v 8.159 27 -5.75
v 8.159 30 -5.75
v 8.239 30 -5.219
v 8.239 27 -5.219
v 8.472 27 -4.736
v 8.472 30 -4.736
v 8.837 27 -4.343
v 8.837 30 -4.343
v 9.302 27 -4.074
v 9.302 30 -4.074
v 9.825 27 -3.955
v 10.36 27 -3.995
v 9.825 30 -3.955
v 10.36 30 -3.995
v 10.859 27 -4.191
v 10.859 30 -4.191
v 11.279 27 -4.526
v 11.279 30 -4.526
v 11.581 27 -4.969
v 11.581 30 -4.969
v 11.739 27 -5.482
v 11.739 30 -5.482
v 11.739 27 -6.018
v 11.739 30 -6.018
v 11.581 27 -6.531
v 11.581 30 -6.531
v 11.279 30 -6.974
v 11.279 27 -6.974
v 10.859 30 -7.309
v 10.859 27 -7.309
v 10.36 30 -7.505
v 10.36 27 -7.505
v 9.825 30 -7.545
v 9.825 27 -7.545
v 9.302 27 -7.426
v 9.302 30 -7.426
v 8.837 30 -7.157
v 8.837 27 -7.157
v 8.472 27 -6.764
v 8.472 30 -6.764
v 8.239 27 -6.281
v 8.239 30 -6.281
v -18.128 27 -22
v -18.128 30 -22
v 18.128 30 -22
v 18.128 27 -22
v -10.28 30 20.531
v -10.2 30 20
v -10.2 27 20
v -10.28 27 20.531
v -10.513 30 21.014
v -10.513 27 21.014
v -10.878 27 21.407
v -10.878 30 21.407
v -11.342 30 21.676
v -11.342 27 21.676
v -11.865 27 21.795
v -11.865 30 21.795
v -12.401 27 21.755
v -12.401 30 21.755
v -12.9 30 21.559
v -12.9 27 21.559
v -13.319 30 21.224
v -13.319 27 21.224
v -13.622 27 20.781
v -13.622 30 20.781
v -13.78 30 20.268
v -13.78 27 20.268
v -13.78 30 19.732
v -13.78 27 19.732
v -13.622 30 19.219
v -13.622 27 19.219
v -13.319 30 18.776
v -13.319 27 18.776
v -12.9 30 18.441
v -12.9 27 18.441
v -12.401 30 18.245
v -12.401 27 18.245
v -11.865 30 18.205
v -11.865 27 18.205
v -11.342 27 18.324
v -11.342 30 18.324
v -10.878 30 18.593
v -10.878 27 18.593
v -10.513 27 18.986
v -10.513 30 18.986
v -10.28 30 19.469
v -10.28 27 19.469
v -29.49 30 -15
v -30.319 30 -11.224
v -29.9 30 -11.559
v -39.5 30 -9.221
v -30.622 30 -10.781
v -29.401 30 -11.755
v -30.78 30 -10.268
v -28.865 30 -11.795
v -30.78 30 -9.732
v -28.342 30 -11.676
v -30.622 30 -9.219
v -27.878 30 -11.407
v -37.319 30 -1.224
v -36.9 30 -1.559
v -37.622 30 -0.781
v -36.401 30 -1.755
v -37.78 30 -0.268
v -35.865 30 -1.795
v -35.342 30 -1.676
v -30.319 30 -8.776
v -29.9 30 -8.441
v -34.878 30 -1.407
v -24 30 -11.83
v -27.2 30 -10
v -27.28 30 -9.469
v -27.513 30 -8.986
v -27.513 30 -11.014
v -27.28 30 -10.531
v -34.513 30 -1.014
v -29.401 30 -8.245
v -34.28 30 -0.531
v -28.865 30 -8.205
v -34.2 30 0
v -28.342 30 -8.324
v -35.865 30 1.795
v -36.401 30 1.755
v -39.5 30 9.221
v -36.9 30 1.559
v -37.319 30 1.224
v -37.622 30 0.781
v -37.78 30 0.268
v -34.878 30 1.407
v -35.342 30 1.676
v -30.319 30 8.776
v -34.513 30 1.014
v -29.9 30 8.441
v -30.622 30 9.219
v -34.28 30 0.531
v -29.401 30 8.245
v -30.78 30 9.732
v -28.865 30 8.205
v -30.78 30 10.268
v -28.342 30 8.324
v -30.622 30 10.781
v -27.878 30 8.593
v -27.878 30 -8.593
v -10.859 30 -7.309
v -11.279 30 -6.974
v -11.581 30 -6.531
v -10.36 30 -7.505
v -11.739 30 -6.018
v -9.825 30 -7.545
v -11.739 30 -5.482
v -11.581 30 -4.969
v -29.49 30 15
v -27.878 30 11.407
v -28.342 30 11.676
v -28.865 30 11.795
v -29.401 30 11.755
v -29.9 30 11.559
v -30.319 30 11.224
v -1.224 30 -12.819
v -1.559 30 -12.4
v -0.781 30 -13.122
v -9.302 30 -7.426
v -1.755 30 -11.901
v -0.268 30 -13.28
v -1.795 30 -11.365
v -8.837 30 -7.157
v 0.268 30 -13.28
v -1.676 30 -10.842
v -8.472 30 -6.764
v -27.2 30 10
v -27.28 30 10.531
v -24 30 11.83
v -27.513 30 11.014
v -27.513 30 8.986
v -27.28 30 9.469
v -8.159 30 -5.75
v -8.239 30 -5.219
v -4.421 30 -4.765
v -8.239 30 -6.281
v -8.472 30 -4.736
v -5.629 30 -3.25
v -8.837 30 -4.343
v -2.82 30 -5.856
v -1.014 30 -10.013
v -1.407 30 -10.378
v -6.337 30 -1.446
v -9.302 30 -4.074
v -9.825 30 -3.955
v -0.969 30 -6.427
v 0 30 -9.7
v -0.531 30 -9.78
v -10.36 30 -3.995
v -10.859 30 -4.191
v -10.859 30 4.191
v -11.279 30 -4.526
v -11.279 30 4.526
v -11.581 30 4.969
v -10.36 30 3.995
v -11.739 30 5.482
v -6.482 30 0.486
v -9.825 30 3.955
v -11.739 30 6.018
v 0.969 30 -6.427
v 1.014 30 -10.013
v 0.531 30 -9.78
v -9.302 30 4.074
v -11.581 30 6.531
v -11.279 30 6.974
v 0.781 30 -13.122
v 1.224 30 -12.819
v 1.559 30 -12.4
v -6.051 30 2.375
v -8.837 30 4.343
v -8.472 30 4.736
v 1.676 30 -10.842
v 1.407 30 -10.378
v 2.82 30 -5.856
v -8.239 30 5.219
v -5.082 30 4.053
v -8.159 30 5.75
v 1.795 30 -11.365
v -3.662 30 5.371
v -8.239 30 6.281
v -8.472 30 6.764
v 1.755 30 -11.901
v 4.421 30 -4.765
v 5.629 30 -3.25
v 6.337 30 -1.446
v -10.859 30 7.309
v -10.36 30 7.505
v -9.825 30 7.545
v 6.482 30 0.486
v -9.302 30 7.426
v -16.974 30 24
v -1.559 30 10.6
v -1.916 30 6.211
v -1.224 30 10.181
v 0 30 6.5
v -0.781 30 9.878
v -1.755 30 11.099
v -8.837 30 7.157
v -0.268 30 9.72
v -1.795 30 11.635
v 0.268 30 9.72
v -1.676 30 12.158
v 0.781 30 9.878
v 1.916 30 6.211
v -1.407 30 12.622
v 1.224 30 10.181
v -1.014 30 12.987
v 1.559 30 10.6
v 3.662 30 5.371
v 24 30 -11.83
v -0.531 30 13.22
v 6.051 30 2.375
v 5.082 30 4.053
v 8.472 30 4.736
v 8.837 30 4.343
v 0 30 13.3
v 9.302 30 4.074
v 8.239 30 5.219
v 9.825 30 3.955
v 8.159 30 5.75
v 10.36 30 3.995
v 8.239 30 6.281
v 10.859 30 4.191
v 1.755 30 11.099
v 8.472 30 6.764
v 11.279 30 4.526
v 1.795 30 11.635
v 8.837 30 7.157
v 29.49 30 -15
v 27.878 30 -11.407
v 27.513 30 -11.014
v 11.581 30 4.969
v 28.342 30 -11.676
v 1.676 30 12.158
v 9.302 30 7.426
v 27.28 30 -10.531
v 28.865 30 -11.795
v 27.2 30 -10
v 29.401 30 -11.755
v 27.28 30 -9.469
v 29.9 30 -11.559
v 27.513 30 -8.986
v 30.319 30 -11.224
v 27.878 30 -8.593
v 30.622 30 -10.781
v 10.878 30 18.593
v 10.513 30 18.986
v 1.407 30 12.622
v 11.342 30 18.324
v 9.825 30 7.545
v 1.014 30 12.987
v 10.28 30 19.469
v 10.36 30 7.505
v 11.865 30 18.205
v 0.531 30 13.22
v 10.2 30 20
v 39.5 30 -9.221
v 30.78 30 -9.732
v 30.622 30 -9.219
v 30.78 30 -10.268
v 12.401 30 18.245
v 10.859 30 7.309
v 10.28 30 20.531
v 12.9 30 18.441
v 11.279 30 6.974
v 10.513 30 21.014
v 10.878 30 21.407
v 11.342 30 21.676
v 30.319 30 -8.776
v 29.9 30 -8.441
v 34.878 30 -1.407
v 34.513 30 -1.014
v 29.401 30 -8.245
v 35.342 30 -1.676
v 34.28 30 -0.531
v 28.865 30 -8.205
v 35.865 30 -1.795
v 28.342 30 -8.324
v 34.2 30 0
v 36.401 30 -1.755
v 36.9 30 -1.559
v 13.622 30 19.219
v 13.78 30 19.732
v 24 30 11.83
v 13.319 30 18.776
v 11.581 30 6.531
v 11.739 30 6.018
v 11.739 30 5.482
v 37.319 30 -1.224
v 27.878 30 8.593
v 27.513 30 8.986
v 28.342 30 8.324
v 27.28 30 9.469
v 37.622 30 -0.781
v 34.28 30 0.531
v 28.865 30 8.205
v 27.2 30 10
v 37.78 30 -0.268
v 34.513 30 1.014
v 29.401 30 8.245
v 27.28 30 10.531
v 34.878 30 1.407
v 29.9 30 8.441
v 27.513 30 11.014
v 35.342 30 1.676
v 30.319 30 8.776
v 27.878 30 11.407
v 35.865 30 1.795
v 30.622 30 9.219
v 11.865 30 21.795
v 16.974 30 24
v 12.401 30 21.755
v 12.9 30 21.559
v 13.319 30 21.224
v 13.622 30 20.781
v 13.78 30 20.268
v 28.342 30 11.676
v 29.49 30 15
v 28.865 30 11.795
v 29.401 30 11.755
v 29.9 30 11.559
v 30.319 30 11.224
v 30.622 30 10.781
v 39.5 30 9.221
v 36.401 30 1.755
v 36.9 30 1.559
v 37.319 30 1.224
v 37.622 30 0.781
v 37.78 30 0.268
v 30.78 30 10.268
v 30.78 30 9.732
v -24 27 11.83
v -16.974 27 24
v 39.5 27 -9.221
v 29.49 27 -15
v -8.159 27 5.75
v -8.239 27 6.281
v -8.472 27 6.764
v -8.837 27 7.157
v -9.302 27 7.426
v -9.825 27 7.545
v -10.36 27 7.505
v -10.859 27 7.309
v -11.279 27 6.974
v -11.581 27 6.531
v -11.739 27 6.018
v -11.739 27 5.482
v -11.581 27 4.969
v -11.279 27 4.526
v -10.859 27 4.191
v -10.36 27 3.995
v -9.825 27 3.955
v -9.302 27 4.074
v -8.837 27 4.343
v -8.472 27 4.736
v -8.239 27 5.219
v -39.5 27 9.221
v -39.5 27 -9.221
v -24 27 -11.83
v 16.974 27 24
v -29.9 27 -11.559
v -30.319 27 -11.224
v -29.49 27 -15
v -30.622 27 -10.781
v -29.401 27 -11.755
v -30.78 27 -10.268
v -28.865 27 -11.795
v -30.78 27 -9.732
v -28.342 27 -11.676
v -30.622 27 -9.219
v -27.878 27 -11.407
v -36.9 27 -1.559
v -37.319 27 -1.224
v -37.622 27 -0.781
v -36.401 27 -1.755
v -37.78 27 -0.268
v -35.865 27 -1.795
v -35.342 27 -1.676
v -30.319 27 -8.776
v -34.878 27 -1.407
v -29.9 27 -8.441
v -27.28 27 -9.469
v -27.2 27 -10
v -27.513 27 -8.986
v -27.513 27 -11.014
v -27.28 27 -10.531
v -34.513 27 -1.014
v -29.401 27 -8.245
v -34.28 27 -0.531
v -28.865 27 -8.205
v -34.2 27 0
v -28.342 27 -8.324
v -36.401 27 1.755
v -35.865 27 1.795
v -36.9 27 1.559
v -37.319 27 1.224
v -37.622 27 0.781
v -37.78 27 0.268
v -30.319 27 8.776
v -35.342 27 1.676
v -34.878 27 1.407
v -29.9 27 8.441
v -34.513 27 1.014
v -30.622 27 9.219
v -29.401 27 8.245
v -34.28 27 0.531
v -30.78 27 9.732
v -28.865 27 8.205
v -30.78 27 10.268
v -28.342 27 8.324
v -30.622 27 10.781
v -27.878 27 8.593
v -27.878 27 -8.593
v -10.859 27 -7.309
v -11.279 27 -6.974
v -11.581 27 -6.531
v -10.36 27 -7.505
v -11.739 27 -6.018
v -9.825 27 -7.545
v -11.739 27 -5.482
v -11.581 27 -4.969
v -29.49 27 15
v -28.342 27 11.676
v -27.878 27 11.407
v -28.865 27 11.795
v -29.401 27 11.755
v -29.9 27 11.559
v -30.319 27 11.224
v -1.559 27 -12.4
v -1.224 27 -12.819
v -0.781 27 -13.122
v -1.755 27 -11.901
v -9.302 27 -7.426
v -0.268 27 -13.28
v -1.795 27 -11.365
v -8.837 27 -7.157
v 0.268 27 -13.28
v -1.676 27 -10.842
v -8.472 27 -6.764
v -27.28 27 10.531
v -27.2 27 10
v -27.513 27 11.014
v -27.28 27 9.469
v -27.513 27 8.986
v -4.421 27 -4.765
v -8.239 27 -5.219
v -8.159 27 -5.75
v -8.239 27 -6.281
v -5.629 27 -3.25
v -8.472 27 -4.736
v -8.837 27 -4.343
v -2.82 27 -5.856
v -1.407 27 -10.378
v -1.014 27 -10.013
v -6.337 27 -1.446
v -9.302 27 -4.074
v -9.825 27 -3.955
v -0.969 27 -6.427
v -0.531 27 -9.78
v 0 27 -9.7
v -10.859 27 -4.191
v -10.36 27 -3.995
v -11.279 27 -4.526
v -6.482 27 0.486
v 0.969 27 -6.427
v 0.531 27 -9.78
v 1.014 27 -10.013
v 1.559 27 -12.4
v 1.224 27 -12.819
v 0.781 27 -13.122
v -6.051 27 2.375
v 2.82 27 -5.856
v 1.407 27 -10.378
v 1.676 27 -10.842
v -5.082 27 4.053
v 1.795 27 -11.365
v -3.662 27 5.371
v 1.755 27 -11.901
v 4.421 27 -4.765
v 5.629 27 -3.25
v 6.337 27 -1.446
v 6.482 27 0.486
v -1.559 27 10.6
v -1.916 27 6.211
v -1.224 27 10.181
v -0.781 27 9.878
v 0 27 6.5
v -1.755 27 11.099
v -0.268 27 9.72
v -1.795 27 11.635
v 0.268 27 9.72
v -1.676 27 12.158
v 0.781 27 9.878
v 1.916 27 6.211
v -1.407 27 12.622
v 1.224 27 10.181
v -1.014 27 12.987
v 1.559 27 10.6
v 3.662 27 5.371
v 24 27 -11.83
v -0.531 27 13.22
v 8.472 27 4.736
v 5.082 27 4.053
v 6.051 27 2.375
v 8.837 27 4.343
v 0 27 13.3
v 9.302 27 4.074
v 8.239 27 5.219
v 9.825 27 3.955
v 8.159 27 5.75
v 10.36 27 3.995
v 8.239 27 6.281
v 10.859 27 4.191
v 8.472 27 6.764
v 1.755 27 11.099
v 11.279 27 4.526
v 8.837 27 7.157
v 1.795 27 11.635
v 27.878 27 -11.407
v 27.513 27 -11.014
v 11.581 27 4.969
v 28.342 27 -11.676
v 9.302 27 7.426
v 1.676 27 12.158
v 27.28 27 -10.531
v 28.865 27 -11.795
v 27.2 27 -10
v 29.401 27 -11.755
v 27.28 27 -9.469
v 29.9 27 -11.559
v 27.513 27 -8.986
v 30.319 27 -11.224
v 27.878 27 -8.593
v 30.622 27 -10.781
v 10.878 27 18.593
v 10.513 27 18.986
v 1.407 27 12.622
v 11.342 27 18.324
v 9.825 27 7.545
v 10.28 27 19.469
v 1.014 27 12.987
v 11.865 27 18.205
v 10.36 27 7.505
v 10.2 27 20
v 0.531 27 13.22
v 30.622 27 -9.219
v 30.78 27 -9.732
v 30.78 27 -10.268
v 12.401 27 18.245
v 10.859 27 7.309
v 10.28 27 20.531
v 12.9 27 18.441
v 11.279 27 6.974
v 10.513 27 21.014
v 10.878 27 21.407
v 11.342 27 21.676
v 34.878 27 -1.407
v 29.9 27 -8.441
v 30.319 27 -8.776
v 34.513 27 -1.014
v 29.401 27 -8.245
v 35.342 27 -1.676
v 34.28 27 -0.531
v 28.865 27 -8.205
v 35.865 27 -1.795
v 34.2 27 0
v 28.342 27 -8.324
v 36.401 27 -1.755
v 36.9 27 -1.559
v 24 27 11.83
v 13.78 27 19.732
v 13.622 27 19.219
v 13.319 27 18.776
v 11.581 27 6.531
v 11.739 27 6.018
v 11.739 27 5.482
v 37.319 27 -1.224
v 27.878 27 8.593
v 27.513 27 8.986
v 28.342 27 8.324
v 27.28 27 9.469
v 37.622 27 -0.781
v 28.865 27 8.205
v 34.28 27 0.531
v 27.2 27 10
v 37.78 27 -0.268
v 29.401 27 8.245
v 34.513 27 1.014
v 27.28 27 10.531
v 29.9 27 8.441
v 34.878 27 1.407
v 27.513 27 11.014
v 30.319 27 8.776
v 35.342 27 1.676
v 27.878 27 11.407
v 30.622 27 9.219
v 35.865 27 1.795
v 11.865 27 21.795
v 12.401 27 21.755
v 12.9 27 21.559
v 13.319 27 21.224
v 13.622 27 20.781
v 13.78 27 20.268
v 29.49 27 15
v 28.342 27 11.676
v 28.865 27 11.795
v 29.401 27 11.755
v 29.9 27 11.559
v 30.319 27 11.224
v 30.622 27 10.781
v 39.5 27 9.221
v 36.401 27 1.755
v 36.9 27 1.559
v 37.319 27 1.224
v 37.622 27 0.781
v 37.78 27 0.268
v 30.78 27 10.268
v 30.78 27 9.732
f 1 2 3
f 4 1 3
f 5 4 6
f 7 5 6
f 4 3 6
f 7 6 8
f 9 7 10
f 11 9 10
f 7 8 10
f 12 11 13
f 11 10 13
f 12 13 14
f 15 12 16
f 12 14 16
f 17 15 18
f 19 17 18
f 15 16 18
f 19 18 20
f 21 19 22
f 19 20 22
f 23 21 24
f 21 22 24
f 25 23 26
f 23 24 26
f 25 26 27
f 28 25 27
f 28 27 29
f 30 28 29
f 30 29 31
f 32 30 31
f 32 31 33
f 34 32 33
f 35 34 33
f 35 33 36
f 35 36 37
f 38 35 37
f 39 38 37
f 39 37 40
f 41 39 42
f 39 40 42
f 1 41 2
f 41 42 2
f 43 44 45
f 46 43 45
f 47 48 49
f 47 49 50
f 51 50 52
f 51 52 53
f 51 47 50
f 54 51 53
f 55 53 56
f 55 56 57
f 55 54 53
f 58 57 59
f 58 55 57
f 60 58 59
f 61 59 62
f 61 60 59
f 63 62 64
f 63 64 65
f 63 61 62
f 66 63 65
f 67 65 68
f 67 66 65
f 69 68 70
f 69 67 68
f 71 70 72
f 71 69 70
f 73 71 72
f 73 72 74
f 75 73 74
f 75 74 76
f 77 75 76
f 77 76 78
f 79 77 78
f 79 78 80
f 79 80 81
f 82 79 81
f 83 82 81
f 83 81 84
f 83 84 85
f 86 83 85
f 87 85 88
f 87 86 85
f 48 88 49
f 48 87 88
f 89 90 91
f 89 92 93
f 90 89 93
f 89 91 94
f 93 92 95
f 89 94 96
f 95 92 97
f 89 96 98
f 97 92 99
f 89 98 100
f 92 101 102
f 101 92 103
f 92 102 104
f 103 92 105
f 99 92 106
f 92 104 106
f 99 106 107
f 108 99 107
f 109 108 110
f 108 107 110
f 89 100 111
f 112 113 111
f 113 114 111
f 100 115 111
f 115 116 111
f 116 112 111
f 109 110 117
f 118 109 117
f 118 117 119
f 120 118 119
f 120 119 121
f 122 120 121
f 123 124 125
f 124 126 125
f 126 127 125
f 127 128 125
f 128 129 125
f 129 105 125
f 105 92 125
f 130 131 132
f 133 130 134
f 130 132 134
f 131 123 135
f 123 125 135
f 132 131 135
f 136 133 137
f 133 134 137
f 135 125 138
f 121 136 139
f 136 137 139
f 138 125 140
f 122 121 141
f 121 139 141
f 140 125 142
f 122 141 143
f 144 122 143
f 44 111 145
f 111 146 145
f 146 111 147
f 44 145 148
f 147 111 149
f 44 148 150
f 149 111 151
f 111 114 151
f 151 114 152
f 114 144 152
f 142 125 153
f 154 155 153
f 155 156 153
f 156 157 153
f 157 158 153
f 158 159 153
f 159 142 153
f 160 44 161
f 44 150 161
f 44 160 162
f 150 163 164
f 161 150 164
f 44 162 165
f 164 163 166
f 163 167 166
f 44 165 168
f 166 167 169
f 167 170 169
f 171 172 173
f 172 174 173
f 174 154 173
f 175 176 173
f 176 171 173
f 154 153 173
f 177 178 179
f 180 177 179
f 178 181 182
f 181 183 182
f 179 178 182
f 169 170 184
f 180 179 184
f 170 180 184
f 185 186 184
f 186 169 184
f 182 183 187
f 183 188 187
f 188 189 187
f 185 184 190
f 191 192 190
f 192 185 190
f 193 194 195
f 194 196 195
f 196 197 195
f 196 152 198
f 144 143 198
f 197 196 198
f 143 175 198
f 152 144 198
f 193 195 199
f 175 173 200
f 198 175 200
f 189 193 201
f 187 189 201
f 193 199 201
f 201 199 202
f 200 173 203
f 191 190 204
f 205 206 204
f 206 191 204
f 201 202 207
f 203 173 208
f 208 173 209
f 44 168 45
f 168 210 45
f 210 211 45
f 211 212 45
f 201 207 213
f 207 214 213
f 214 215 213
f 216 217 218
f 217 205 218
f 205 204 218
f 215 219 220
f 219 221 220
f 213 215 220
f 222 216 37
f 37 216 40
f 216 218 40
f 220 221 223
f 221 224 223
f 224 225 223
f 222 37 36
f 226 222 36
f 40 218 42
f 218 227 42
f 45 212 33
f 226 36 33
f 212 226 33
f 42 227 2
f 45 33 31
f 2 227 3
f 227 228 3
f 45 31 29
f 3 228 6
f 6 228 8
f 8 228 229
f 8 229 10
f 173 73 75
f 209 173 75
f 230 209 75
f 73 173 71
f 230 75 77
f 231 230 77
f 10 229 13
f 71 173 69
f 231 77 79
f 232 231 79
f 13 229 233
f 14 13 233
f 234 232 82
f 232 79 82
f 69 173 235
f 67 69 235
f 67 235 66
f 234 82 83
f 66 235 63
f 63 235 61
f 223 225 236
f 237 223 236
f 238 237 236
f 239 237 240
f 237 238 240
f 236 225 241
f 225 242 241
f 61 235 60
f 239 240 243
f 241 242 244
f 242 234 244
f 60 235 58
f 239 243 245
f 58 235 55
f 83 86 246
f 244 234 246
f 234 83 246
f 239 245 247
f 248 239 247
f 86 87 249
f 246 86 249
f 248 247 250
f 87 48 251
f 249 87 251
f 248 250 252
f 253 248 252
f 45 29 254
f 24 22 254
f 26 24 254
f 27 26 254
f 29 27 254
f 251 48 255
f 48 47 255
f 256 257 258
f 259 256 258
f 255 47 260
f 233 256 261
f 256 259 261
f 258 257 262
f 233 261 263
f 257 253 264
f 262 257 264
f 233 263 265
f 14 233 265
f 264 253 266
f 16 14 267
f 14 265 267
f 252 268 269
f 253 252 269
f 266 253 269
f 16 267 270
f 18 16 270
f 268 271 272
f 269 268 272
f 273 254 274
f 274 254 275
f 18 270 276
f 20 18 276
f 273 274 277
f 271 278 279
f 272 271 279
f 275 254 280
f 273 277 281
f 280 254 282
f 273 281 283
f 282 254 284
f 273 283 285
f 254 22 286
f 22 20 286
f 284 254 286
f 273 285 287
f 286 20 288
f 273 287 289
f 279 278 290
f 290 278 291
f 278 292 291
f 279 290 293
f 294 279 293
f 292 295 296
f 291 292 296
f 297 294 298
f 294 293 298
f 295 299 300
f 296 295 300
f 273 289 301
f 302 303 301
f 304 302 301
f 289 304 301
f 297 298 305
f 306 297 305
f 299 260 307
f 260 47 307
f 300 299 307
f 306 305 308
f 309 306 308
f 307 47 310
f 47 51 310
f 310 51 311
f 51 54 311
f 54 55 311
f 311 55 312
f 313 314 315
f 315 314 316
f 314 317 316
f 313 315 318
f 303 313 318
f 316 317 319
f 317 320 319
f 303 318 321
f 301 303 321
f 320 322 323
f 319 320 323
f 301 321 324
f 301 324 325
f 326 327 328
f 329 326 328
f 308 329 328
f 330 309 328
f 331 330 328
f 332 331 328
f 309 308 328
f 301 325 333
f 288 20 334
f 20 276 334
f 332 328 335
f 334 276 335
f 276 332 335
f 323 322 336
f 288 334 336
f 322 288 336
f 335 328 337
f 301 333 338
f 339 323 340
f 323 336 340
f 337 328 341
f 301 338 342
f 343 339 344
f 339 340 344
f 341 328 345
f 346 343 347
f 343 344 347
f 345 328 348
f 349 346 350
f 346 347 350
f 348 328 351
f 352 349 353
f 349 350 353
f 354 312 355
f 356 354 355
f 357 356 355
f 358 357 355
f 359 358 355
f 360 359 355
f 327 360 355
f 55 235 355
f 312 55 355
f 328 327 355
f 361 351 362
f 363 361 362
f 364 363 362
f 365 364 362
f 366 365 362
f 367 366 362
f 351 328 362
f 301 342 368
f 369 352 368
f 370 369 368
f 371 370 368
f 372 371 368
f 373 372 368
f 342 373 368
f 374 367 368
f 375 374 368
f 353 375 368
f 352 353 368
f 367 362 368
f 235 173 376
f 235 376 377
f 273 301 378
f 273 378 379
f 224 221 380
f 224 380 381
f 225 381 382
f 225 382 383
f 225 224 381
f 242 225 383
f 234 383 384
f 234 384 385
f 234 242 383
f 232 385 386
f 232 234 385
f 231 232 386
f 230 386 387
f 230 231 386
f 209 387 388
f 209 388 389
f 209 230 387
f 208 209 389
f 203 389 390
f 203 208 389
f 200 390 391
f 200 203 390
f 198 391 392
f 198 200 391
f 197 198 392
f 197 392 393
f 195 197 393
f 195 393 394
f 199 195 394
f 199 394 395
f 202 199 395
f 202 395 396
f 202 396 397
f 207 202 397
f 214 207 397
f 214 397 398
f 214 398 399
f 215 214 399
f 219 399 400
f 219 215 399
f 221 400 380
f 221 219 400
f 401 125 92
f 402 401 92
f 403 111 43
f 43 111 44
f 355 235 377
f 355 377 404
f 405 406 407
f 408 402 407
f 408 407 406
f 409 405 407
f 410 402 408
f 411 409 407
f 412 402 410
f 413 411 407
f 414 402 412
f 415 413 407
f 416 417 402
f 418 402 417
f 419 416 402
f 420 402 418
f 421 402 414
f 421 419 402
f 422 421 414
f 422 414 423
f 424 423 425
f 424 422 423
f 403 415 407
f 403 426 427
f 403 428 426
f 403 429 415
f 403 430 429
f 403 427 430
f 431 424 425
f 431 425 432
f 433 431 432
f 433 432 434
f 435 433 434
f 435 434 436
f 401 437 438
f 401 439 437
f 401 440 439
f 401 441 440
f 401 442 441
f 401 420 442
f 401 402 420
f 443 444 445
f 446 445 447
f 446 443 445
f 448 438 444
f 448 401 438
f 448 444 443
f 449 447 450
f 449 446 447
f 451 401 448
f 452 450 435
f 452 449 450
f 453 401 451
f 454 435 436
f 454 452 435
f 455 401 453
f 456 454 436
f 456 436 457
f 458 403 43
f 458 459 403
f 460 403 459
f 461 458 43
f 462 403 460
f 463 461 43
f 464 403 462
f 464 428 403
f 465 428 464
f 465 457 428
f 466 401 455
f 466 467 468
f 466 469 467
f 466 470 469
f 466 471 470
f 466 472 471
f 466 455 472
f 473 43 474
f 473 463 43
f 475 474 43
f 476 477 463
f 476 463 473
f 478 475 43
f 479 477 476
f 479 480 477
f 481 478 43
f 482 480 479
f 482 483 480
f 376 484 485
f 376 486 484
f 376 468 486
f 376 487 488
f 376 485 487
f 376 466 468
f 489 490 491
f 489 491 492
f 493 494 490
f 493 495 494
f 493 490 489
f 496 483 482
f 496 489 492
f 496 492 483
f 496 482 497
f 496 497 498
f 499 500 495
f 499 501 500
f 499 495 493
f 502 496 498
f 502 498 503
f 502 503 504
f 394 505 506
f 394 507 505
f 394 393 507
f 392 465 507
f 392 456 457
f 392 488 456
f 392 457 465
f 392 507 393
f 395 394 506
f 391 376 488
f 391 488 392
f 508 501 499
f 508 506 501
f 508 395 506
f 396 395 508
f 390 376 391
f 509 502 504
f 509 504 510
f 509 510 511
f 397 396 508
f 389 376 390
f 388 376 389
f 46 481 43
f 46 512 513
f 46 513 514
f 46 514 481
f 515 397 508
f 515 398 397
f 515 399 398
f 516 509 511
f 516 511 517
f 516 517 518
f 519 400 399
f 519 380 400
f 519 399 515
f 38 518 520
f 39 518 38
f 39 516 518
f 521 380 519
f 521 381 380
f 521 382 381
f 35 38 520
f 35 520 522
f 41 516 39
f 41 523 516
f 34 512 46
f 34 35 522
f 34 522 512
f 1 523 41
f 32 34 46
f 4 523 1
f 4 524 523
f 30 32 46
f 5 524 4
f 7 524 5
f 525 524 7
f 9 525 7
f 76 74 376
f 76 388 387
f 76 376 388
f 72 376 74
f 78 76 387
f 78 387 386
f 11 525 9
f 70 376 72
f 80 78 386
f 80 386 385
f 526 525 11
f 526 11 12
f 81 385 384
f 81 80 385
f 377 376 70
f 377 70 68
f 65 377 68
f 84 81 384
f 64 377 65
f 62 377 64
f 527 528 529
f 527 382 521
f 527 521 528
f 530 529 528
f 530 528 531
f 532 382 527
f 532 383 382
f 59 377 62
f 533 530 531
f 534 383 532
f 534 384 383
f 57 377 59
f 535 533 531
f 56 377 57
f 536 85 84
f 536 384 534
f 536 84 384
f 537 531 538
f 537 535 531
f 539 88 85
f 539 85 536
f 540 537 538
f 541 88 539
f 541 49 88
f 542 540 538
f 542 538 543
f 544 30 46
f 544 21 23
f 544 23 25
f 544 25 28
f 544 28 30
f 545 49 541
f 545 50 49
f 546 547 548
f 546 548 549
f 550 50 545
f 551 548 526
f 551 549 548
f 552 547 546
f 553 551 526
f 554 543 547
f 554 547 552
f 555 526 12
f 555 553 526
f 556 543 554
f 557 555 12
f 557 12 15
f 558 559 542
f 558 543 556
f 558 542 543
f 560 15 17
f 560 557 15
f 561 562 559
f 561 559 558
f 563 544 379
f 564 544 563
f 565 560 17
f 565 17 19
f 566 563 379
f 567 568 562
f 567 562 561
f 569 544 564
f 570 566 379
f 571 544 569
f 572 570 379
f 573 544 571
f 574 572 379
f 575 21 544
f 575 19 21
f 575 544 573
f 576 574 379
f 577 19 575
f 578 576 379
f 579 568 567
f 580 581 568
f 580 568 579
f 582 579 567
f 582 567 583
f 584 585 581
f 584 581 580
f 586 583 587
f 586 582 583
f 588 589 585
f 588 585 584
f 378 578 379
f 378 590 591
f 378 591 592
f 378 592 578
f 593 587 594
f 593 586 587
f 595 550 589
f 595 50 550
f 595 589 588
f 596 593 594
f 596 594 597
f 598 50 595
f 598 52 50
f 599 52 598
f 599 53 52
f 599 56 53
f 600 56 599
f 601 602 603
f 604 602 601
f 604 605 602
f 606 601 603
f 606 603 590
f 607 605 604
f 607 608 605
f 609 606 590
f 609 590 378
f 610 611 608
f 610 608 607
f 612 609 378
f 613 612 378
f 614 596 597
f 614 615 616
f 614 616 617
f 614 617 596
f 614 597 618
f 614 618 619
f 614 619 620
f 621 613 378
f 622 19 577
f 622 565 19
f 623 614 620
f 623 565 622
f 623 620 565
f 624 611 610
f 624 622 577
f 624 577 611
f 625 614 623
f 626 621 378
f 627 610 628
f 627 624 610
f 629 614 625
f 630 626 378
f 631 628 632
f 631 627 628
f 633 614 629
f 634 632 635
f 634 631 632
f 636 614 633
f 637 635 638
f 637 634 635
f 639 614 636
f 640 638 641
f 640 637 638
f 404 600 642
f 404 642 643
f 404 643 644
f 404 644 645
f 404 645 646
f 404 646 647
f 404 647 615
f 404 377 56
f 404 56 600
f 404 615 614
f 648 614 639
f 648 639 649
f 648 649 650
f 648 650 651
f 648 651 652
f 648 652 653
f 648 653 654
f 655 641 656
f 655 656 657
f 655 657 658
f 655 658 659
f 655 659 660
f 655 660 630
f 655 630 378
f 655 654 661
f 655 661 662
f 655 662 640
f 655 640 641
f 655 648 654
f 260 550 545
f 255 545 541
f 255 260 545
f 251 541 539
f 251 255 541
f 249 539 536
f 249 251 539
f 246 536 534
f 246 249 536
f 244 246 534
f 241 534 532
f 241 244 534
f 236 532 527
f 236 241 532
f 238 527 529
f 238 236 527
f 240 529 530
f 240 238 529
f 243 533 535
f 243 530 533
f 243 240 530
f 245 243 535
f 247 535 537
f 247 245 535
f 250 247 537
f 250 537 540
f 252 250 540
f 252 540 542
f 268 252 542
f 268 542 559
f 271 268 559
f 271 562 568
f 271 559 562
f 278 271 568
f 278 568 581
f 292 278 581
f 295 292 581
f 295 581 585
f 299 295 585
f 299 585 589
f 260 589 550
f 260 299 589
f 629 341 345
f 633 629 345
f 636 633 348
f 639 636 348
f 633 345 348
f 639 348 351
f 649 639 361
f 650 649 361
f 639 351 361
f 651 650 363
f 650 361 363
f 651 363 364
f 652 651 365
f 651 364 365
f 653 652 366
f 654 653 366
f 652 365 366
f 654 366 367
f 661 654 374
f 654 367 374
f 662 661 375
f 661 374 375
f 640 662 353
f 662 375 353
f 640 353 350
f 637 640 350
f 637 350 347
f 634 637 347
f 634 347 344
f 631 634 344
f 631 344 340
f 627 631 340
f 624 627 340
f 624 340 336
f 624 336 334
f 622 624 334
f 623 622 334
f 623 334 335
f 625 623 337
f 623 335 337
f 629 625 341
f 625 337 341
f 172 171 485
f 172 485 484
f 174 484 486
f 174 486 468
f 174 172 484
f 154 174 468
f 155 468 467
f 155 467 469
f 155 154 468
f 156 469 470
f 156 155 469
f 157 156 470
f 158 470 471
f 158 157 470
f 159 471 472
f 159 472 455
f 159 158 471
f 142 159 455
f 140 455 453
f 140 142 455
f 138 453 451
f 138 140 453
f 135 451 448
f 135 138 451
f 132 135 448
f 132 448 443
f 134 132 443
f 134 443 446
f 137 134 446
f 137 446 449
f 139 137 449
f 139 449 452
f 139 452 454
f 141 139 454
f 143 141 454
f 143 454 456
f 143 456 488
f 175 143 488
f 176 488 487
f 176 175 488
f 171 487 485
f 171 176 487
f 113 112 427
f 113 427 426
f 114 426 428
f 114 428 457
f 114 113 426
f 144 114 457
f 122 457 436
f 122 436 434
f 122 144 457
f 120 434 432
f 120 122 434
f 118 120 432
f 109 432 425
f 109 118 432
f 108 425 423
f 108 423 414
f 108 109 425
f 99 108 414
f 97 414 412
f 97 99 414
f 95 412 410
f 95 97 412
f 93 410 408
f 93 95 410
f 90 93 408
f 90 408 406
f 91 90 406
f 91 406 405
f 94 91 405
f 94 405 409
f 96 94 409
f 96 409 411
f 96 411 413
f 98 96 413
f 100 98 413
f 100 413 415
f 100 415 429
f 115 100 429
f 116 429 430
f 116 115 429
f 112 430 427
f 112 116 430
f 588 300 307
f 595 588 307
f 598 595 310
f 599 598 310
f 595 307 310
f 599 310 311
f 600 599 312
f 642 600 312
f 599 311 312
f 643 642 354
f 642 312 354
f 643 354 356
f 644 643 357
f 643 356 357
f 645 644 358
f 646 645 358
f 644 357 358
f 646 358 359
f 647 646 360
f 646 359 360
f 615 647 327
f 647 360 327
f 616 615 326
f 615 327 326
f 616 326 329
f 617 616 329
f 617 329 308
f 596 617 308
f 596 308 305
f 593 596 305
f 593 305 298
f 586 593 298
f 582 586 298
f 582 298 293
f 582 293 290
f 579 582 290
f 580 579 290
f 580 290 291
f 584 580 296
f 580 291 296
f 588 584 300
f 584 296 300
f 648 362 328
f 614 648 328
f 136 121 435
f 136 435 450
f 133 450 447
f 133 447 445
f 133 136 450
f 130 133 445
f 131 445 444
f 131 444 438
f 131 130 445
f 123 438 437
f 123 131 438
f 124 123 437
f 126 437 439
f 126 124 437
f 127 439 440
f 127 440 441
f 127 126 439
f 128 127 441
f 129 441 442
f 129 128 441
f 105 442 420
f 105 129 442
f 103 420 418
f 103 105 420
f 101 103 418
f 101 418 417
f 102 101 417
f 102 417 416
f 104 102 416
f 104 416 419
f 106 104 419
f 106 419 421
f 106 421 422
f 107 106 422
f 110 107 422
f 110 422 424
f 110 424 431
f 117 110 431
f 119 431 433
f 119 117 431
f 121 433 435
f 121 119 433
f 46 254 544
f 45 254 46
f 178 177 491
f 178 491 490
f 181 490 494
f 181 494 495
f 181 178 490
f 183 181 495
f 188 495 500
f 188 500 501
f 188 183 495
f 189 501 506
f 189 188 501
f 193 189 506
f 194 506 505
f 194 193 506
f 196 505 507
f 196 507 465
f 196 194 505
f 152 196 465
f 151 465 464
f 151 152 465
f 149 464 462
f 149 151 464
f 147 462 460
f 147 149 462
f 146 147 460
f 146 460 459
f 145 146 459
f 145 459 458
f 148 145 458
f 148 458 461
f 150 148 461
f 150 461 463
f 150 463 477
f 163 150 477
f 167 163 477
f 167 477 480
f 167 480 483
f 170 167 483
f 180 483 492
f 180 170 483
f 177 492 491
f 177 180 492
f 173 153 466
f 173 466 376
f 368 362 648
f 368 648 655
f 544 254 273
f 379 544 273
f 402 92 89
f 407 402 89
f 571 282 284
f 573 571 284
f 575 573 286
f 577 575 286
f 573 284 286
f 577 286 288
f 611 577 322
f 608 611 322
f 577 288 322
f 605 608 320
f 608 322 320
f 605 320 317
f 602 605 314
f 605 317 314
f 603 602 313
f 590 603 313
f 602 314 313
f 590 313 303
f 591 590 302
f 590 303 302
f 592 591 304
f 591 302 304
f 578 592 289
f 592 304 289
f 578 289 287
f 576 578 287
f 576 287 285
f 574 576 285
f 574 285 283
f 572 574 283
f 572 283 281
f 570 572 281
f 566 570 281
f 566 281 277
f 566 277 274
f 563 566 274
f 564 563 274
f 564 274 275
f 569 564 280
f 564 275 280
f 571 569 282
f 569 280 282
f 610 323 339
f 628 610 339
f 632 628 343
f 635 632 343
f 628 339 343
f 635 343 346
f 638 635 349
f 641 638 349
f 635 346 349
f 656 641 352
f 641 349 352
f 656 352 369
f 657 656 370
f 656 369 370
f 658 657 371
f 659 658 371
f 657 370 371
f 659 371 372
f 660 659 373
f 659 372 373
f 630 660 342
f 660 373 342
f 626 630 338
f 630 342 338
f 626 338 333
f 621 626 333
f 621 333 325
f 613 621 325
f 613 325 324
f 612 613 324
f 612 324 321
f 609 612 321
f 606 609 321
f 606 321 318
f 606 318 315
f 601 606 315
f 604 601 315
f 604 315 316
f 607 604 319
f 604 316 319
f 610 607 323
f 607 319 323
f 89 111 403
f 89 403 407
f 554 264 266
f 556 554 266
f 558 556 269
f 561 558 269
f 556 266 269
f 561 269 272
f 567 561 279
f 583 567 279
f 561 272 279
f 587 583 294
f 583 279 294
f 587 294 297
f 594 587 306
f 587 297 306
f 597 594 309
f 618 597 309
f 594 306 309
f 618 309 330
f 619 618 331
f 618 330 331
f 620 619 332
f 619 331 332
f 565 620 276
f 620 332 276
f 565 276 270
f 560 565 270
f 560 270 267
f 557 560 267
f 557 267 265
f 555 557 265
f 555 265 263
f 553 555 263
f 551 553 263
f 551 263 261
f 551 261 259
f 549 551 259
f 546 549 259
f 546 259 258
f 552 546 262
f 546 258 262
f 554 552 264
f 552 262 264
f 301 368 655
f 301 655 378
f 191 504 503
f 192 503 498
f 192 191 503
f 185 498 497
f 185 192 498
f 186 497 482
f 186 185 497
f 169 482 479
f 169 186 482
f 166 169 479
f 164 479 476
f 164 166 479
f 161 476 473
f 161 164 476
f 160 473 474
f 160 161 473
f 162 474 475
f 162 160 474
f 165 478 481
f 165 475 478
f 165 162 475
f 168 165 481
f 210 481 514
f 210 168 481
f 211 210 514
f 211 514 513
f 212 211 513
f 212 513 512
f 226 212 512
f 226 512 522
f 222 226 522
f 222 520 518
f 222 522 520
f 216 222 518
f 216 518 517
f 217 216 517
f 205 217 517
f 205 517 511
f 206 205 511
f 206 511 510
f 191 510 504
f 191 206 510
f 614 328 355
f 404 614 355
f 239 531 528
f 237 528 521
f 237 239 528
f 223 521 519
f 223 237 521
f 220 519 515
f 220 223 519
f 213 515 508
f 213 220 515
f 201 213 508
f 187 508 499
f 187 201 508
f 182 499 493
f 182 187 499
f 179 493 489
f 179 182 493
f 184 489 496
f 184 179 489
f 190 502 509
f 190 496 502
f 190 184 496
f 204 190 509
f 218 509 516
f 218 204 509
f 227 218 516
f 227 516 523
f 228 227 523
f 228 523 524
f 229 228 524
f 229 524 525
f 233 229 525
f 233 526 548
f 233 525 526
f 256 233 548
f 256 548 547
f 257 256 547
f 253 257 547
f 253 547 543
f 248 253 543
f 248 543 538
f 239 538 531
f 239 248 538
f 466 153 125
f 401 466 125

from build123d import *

# Parameters (mm, degrees)
SKETCH157_R  = 1.8
PAD122_DEPTH = 3


with BuildPart() as pad122:
    # Sketch157 → Pad122 (new body)
    with BuildSketch(Plane.XZ.offset(-30)):
        with BuildLine():
            Line((-29.490381, 15), (-39.5, 9.220944))
            Line((-39.5, 9.220944), (-39.5, -9.220944))
            Line((-39.5, -9.220944), (-29.490381, -15))
            Line((-24, -11.830127), (-29.490381, -15))
            Line((-24, -11.830127), (-18.128421, -22))
            Line((-18.128421, -22), (0, -22))
            Line((0, -13.3), (0, -22))
            ThreePointArc((0, -9.7), (-1.8, -11.5), (0, -13.3))
            Line((0, -6.5), (0, -9.7))
            ThreePointArc((0, 6.5), (-6.5, 0), (0, -6.5))
            Line((0, 9.7), (0, 6.5))
            ThreePointArc((0, 13.3), (-1.8, 11.5), (0, 9.7))
            Line((0, 13.3), (0, 24))
            Line((-16.973721, 24), (0, 24))
            Line((-24, 11.830127), (-16.973721, 24))
            Line((-29.490381, 15), (-24, 11.830127))
        make_face()
        with Locations((-29, 10)):
            Circle(SKETCH157_R, mode=Mode.SUBTRACT)
        with Locations((-29, -10)):
            Circle(SKETCH157_R, mode=Mode.SUBTRACT)
        with Locations((-12, 20)):
            Circle(SKETCH157_R, mode=Mode.SUBTRACT)
        with Locations((-9.959292, 5.75)):
            Circle(SKETCH157_R, mode=Mode.SUBTRACT)
        with Locations((-9.959292, -5.75)):
            Circle(SKETCH157_R, mode=Mode.SUBTRACT)
        with Locations((-36, 0)):
            Circle(SKETCH157_R, mode=Mode.SUBTRACT)
    extrude(amount=PAD122_DEPTH)


with BuildPart() as motorcageface:
    # Part__Mirroring008: instance of Pad122
    add(pad122.part.mirror(Plane(origin=(0, 0, 0), x_dir=(0, -1, 0), z_dir=(1, 0, 0))))

    # Fusion004020015: union Pad122
    add(pad122.part)


solid = motorcageface.part
